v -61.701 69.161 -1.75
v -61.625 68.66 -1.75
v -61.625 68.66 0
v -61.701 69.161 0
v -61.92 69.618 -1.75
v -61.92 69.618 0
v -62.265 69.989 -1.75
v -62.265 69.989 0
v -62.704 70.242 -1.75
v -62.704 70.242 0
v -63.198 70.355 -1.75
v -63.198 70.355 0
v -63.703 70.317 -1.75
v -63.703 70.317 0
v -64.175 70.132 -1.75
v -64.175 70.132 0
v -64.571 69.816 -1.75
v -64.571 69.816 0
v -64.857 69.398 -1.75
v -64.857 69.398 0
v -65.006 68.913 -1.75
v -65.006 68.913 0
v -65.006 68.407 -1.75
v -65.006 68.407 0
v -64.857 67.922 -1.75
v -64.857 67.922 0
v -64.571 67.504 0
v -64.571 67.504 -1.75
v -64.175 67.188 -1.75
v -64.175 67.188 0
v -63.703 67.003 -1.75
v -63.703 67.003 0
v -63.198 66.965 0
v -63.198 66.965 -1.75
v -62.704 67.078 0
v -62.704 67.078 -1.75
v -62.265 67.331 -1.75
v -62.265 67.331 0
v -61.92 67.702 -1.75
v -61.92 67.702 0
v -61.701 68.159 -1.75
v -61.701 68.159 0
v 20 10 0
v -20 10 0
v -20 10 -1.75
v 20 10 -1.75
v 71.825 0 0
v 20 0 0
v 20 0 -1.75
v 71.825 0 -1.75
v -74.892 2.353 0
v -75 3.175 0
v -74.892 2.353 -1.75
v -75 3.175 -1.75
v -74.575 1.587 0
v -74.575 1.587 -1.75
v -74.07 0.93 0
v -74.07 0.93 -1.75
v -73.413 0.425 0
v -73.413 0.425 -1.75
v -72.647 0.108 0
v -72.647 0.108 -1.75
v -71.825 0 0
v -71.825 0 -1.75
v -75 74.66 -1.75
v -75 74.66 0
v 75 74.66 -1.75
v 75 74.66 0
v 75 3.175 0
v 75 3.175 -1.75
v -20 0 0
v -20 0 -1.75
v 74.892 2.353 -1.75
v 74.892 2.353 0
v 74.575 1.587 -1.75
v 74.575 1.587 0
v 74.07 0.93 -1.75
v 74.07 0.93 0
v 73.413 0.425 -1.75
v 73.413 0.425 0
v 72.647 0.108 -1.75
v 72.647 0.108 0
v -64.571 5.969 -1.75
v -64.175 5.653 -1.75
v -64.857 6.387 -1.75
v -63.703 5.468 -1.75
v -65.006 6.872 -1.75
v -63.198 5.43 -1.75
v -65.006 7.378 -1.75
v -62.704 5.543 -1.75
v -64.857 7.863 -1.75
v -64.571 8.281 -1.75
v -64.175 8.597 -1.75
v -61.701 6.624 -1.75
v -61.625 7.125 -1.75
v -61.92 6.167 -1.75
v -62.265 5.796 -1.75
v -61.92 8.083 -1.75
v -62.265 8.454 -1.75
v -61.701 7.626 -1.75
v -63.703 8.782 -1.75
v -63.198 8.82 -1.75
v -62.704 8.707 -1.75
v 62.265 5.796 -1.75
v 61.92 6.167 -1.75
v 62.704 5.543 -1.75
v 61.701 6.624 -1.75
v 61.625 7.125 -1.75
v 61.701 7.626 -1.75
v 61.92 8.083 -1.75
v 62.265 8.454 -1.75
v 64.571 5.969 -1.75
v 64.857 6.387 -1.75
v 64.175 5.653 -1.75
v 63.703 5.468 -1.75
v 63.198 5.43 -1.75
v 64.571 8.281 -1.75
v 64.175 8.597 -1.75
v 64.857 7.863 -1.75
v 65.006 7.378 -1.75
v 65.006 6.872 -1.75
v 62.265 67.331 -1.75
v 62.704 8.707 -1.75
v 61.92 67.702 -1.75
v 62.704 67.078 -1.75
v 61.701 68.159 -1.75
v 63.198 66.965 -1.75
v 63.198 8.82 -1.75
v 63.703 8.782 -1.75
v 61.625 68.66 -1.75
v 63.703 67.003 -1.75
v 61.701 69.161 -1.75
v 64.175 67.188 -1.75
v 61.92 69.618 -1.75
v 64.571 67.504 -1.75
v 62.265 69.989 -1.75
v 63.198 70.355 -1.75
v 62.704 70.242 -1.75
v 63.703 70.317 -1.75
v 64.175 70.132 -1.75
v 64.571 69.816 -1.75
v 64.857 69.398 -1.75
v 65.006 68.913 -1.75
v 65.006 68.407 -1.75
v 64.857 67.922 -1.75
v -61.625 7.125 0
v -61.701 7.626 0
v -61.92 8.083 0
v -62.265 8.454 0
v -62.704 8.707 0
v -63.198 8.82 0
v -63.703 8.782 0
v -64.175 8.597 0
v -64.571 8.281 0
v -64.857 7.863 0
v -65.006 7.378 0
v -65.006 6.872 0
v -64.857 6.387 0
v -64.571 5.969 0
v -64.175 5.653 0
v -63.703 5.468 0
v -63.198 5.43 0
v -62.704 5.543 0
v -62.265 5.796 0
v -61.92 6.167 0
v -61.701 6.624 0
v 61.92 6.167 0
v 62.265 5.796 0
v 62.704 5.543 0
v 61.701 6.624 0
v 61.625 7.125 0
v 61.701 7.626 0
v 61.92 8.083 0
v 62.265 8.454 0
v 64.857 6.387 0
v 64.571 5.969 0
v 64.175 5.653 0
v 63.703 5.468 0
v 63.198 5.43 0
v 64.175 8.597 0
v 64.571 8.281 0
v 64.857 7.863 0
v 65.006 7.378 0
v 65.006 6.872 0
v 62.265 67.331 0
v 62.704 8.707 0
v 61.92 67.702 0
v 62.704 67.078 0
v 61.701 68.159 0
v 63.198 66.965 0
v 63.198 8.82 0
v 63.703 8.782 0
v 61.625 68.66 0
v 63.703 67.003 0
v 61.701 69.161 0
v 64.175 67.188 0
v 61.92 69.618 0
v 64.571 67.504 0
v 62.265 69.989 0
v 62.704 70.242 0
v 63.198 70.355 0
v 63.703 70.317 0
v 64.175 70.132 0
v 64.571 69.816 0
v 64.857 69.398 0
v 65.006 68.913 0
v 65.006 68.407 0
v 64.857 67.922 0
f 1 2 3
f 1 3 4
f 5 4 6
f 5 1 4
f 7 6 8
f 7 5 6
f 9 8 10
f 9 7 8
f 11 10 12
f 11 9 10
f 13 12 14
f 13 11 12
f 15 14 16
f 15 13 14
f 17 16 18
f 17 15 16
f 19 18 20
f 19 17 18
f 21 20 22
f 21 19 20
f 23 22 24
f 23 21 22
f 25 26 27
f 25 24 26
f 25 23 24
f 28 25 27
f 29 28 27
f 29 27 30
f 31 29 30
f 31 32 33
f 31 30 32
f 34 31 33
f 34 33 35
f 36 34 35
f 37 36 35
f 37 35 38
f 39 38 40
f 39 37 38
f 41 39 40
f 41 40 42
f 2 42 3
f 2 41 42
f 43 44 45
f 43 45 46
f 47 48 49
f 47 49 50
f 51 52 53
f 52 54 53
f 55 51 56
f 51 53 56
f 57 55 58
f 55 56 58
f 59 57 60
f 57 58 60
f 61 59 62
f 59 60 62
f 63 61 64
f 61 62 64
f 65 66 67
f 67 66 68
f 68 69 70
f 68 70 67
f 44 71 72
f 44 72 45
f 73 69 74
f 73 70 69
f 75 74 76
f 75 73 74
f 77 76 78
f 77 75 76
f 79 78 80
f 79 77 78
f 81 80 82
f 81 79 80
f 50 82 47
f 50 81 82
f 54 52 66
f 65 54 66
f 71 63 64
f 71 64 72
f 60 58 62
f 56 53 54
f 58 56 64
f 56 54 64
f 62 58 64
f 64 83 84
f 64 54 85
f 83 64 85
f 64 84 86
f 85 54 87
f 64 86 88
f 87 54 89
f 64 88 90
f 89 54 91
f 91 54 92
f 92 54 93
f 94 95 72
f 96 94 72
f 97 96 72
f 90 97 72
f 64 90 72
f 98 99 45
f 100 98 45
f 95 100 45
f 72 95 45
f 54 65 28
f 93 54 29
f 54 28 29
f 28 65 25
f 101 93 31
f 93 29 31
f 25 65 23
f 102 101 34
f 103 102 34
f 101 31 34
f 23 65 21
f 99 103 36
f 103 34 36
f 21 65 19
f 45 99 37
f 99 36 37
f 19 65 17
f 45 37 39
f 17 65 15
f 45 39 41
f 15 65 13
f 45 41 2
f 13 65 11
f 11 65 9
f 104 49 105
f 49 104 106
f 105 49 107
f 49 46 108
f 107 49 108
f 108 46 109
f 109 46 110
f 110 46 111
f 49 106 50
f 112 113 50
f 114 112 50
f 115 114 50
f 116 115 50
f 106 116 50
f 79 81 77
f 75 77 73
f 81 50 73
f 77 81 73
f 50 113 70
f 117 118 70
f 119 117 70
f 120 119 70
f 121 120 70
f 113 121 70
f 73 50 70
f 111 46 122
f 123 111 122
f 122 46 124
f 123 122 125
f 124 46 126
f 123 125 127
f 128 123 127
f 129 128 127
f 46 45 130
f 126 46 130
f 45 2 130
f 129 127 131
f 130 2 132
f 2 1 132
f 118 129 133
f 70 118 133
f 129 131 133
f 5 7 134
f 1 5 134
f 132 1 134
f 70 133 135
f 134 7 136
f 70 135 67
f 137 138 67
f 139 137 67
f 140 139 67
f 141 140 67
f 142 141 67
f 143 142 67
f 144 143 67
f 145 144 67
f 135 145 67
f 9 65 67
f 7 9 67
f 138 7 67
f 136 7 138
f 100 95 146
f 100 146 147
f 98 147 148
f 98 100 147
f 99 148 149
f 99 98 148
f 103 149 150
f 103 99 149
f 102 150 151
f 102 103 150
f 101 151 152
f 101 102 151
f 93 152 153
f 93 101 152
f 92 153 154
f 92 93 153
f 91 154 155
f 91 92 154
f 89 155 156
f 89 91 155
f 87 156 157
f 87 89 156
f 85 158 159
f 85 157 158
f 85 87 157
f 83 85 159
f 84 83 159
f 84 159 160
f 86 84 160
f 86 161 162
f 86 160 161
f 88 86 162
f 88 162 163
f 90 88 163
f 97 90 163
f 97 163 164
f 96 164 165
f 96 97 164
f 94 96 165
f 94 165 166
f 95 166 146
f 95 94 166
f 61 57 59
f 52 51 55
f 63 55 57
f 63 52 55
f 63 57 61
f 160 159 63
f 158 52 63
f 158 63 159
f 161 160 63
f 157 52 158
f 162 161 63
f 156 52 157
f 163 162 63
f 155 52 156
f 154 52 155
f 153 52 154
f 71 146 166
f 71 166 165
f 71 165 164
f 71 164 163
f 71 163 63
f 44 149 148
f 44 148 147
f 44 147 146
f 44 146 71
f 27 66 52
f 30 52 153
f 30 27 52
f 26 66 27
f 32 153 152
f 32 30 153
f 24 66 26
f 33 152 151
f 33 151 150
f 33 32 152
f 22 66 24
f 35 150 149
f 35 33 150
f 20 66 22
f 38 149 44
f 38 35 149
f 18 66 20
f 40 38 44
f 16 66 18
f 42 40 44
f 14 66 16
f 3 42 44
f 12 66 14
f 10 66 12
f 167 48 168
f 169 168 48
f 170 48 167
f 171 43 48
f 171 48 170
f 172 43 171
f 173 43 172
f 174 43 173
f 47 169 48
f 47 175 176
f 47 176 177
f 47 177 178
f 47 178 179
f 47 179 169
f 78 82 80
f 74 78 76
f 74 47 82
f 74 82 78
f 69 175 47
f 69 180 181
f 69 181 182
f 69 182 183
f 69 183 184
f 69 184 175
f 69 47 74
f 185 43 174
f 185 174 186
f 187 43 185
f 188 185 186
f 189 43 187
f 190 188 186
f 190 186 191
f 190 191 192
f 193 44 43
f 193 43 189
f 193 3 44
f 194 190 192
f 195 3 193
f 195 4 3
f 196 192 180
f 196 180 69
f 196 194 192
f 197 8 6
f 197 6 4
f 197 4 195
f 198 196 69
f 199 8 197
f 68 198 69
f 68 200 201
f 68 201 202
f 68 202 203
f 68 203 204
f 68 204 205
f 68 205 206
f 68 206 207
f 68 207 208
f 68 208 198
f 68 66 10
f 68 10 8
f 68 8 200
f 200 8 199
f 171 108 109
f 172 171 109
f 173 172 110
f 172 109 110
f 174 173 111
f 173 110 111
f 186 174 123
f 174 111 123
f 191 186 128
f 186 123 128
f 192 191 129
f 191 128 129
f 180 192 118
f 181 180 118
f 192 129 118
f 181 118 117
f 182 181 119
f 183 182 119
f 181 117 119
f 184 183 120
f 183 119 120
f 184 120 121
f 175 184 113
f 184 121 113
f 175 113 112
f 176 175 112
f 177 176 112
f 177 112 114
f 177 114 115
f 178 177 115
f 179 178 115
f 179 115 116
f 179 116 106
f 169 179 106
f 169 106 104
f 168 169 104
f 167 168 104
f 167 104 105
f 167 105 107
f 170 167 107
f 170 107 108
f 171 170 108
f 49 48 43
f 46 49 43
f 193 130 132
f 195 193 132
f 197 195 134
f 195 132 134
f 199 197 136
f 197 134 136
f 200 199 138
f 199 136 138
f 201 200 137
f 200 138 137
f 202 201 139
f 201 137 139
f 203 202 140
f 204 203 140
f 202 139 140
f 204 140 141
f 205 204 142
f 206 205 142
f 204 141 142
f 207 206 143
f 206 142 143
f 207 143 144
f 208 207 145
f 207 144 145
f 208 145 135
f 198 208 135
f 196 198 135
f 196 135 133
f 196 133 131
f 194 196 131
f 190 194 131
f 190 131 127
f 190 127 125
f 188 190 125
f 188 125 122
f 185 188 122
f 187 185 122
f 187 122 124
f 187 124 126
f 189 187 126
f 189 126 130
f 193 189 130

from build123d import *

# Parameters (mm, degrees)
SKETCH1_W            = 150
SKETCH1_H            = 74.66
BASE_FLANGE1_DEPTH   = 1.75
CUT_EXTRUDE1_REACH   = 107.84
SKETCH2_W            = 40
SKETCH2_H            = 10
M3_CLEARANCE_HOLE1_D = 3.4
FILLET1_R            = 3.175


# Sheet-metal steps are written as plain solids
with BuildPart() as part:
    # Sketch1 → Base-Flange1 (new body)
    with BuildSketch(Plane.XY):
        with Locations((0, 37.33)):
            Rectangle(SKETCH1_W, SKETCH1_H)
    extrude(amount=-BASE_FLANGE1_DEPTH)

    # Sketch2 → Cut-Extrude1 (cut, up to next)
    with BuildSketch(Plane.XY, mode=Mode.PRIVATE) as cut_extrude1_sk1:
        with Locations((0, 5)):
            Rectangle(SKETCH2_W, SKETCH2_H)
    cut_extrude1_tool1 = extrude(cut_extrude1_sk1.sketch, amount=-CUT_EXTRUDE1_REACH, mode=Mode.PRIVATE) & part.part
    add(cut_extrude1_tool1.solids().sort_by_distance((0, 5, 0))[0], mode=Mode.SUBTRACT)

    # M3 Clearance Hole1 (through all)
    with Locations(Plane.XY):
        with Locations((63.325, 68.66), (63.325, 7.125)):
            m3_clearance_hole1 = Hole(M3_CLEARANCE_HOLE1_D / 2)

    # Mirror1: M3 Clearance Hole1 across plane
    add(m3_clearance_hole1.mirror(Plane(origin=(0, 0, 0), x_dir=(0, 0, 1), z_dir=(1, 0, 0))), mode=Mode.SUBTRACT)

    # Fillet1
    fillet1_edges = [part.edges().sort_by_distance(p)[0] for p in [
        (75, 0, -0.875),
        (-75, 0, -0.875),
    ]]
    fillet(fillet1_edges, radius=FILLET1_R)


solid = part.part
